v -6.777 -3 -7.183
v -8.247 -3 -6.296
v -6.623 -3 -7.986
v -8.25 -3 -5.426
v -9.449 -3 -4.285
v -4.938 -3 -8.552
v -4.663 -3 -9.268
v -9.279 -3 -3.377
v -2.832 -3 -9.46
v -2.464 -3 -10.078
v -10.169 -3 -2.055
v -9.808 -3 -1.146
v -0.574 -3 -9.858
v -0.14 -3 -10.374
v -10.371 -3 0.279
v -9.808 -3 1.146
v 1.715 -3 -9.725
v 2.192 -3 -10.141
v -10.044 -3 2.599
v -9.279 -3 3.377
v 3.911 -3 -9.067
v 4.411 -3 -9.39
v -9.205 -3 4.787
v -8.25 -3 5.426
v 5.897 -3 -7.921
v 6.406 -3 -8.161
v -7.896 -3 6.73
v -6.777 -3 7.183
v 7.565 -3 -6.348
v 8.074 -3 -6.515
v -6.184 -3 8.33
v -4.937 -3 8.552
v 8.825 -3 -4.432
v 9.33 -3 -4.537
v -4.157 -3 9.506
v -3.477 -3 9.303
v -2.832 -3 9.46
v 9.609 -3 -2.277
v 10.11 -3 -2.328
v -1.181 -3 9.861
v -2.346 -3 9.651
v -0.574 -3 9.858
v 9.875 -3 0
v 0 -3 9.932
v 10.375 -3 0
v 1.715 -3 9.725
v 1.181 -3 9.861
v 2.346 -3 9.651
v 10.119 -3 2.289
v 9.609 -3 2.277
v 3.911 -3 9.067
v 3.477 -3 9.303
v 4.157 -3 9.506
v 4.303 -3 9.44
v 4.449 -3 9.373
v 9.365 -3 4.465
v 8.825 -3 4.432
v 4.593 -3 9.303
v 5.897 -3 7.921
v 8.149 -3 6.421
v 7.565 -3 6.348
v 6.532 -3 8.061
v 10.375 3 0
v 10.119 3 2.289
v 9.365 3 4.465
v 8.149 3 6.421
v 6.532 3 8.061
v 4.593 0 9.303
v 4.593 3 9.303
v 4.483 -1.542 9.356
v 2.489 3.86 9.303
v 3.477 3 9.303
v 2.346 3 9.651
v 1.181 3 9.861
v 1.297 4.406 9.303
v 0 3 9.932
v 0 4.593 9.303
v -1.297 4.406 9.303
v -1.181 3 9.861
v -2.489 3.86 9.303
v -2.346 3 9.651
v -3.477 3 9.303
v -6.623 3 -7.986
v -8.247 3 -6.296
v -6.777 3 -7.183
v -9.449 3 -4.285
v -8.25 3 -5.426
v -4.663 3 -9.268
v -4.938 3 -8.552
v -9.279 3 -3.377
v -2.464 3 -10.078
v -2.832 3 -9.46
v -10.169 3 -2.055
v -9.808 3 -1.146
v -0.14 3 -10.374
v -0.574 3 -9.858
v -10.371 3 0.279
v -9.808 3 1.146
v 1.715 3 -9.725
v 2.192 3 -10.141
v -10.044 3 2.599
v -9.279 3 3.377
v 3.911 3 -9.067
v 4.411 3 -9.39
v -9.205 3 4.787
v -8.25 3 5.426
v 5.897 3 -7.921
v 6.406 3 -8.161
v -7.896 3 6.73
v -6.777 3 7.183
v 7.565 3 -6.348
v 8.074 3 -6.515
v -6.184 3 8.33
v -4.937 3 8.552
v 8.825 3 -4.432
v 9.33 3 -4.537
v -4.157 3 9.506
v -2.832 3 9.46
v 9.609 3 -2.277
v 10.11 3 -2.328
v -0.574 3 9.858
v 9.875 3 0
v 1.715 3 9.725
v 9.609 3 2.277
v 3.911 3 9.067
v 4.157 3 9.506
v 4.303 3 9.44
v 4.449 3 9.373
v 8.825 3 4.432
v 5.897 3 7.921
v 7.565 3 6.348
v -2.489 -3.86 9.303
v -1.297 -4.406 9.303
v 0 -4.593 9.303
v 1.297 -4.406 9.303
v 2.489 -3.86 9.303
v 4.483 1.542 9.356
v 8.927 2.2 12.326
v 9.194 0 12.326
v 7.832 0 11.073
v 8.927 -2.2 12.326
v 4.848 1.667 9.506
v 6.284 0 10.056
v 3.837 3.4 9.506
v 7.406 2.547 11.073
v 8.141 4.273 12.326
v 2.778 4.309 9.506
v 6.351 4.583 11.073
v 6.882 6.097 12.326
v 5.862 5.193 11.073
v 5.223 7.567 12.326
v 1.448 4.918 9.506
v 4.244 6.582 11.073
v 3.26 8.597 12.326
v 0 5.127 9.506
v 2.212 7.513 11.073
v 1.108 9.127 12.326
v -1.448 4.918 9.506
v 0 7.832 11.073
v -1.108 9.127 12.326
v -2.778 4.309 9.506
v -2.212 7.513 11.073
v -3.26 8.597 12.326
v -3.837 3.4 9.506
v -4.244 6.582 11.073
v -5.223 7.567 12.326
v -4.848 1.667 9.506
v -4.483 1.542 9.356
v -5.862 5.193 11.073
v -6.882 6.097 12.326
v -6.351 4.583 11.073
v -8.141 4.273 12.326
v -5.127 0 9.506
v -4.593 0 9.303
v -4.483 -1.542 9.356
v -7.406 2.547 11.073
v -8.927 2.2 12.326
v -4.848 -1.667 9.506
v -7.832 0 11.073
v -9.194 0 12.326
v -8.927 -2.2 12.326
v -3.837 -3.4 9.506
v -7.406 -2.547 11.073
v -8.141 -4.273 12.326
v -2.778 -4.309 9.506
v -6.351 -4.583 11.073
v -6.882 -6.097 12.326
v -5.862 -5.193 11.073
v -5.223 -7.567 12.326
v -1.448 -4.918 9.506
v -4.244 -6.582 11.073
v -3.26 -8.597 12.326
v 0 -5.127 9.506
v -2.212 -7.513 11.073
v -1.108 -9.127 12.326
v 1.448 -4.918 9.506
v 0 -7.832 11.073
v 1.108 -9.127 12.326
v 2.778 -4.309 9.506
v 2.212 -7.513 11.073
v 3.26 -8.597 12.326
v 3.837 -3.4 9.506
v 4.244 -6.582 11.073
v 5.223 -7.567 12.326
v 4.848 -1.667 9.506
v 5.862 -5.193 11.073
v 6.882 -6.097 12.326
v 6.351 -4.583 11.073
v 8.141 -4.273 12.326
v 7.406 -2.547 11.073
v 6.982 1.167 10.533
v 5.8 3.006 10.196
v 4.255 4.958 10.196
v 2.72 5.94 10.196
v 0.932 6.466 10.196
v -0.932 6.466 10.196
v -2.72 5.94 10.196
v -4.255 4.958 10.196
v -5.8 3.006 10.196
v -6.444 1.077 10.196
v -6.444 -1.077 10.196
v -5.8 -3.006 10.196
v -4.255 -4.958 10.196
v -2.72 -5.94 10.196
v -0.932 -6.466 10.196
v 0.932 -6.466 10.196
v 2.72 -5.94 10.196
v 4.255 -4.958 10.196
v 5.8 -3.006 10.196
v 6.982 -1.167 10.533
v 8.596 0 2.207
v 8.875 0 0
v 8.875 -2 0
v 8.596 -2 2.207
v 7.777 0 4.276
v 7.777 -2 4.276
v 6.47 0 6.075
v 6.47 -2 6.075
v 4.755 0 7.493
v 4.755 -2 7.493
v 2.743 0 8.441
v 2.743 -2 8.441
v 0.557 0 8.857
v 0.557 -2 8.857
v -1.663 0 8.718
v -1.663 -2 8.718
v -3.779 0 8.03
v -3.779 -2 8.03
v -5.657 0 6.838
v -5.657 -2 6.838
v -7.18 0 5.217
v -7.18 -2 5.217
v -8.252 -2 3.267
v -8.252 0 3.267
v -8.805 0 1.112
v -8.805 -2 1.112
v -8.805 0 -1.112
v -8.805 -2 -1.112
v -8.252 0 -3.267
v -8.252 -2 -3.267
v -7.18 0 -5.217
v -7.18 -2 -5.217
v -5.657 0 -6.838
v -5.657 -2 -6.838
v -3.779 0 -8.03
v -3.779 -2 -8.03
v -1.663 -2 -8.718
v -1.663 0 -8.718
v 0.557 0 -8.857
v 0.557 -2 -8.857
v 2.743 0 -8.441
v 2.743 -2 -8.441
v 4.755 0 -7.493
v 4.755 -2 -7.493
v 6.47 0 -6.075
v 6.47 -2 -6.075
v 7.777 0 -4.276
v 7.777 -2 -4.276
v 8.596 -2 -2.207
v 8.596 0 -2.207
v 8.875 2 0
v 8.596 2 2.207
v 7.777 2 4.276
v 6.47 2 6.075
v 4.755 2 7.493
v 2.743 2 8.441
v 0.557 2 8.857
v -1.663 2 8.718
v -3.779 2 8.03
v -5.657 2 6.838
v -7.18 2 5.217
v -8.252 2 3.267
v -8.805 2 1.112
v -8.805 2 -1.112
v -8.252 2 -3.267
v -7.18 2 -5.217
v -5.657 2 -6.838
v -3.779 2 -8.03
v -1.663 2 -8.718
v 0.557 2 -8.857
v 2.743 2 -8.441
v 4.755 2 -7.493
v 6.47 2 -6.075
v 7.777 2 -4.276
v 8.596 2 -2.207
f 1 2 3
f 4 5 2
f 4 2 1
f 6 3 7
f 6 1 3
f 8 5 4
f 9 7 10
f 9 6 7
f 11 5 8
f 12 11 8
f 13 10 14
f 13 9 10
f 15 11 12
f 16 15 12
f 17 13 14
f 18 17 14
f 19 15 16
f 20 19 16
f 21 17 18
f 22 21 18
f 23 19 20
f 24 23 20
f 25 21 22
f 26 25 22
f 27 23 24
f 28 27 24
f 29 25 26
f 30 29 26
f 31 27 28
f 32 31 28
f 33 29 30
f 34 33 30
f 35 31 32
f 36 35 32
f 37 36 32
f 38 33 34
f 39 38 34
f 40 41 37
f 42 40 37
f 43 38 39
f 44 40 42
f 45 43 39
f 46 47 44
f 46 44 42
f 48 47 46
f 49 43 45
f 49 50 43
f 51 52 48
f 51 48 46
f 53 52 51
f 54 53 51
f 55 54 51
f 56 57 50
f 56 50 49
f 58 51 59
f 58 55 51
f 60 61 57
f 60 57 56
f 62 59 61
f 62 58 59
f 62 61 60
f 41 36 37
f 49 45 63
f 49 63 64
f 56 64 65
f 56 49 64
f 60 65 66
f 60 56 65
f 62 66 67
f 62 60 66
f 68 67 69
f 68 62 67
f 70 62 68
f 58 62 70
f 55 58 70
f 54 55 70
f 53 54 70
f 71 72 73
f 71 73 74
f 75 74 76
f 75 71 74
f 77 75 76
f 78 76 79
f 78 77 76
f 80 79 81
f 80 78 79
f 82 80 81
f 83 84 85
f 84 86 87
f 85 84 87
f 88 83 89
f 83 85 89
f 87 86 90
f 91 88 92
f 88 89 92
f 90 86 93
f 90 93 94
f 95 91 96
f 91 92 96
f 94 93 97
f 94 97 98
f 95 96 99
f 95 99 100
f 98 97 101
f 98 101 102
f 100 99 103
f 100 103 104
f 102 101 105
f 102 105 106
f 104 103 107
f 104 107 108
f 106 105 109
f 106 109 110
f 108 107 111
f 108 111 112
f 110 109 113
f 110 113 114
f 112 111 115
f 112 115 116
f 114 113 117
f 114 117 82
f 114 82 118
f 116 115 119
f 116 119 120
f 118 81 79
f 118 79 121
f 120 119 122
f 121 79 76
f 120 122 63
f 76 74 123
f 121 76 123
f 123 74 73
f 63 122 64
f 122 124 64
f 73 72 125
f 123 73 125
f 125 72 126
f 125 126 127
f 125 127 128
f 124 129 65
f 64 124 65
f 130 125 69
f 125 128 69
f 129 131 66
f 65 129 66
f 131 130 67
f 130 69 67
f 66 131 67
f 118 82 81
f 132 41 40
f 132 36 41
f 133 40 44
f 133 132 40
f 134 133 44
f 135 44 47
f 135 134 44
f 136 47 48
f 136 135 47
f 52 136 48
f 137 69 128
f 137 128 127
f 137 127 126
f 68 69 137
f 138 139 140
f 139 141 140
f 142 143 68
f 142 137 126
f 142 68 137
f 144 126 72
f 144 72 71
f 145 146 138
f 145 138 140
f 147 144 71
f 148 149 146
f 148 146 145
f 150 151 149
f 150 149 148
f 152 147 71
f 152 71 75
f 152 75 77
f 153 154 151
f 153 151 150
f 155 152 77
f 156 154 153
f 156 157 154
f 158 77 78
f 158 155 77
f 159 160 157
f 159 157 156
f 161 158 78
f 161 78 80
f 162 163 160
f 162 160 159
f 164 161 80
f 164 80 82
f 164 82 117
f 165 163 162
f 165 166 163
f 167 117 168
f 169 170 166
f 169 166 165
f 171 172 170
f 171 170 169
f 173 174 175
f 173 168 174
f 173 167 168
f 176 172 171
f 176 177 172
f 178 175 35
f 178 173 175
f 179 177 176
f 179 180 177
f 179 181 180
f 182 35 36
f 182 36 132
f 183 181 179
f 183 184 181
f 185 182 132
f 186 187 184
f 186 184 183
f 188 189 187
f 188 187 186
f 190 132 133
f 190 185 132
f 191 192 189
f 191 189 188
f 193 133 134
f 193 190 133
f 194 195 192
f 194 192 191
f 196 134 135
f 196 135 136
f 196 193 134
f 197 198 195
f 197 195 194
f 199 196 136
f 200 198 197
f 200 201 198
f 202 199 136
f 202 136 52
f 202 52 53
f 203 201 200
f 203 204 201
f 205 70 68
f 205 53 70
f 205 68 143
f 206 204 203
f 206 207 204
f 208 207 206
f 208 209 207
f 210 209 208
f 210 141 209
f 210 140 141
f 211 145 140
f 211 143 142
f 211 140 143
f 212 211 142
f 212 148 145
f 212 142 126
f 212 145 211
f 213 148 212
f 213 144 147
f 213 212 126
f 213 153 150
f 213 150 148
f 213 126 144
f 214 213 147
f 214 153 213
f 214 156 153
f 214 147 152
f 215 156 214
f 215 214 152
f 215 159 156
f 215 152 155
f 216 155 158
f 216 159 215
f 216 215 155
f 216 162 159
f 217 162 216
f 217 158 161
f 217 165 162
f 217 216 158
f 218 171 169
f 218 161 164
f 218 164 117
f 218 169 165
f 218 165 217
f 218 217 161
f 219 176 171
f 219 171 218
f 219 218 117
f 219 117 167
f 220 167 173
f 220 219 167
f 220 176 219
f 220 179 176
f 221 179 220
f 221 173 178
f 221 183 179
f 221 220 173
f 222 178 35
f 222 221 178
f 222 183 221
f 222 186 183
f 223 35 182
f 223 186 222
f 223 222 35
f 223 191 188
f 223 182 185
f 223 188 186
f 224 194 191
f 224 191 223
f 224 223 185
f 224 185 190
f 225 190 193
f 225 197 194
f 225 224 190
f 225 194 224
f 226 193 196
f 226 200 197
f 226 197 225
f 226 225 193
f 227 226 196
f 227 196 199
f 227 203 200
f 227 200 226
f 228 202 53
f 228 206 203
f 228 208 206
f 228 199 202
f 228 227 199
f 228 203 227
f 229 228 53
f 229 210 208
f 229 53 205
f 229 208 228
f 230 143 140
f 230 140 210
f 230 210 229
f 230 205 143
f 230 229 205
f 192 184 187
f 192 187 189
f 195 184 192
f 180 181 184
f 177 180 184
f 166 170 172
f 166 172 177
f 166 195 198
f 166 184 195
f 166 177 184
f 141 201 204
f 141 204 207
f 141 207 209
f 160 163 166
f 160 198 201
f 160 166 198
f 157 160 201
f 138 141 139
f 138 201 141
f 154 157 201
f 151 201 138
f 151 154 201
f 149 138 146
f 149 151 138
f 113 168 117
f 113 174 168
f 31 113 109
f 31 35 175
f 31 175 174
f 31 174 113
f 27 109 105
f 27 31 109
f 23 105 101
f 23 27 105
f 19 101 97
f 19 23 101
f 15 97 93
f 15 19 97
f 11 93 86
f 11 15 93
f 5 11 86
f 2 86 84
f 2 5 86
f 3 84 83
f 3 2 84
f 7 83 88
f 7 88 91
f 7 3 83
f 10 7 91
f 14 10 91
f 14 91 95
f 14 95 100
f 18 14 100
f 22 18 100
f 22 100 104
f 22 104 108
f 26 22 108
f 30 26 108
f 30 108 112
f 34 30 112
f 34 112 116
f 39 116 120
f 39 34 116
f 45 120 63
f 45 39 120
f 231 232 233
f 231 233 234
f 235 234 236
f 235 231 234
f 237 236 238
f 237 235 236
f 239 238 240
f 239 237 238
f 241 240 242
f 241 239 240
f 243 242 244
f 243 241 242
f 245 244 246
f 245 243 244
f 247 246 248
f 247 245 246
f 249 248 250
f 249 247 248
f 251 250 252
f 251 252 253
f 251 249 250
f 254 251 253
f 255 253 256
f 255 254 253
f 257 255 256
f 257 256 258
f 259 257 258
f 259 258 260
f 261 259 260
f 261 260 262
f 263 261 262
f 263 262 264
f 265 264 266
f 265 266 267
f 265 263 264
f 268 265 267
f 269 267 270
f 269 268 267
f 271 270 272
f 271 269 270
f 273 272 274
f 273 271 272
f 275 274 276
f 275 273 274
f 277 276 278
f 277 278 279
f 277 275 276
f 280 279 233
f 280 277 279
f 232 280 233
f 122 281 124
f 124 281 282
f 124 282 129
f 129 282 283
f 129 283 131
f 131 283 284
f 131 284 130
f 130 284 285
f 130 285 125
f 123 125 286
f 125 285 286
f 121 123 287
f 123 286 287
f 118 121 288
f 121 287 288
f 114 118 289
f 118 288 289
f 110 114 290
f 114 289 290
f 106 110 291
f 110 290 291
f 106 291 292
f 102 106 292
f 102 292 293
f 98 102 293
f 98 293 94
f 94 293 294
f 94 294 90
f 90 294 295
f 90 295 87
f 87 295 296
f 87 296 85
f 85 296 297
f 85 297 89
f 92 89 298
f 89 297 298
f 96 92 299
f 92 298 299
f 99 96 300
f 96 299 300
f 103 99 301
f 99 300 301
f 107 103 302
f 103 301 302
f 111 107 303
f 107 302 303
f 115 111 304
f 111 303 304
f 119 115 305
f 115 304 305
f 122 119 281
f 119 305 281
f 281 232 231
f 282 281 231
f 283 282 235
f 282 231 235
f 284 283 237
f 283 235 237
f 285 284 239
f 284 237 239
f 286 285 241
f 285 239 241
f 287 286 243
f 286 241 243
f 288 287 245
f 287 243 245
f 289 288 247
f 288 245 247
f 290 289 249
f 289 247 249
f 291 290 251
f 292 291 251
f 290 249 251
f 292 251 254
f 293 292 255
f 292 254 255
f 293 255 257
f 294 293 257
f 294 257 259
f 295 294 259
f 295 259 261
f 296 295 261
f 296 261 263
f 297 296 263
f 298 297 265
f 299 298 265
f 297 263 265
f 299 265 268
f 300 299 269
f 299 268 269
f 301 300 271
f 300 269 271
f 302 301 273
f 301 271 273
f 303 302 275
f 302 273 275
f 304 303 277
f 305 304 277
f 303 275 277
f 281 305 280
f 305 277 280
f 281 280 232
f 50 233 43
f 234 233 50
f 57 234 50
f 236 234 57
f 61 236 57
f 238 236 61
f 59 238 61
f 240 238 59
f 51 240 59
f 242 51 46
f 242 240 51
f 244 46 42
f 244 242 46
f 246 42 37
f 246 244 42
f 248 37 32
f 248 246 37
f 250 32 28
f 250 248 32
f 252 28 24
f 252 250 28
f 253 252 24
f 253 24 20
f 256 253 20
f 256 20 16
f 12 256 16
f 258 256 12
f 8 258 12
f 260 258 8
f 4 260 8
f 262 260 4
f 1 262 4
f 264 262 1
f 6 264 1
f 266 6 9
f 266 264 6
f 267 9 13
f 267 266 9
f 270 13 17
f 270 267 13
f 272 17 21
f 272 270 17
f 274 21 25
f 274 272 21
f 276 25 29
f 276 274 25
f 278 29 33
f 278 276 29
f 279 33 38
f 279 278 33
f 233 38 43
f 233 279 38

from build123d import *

# Parameters (mm, degrees)
F0_R          = 8.875
F3_DEPTH      = 3
F3_DEPTH_BACK = 3
F4_SIZE       = 1


with BuildPart() as f2:
    # F0 (on Front) → F2 (revolve)
    with BuildSketch(Plane.XZ):
        with BuildLine():
            ThreePointArc((0, 10.375), (2.3580401671, 10.1034781917), (4.5926568488, 9.3031246401))
            ThreePointArc((4.5926568488, 9.3031246401), (7.0784745003, 10.5329995788), (9.1944970191, 12.325854972))
            Line((9.1944970191, 12.325854972), (0, 12.325854972))
            Line((0, 12.325854972), (0, 10.375))
        make_face()
    revolve(axis=Axis((0, 0, 0), (0, 0, 1)))

    # F0 (on Front) → F3 (join, two sides)
    with BuildSketch(Plane.XZ) as f3_sk:
        with BuildLine():
            ThreePointArc((0, 10.375), (-7.3362328548, -7.3362328548), (10.375, 0))
            ThreePointArc((10.375, 0), (8.8116241354, 5.4768517505), (4.5926568488, 9.3031246401))
            Line((4.5926568488, 9.3031246401), (0, 9.3031246401))
            Line((0, 9.3031246401), (0, 10.375))
        make_face()
        Circle(F0_R, mode=Mode.SUBTRACT)
        with BuildLine():
            Line((0, 9.3031246401), (4.5926568488, 9.3031246401))
            ThreePointArc((4.5926568488, 9.3031246401), (2.3580401671, 10.1034781917), (0, 10.375))
            Line((0, 10.375), (0, 9.3031246401))
        make_face()
    extrude(amount=F3_DEPTH)
    extrude(f3_sk.sketch, amount=-F3_DEPTH_BACK)

    # F4
    f4_edges = [f2.edges().sort_by_distance(p)[0] for p in [
        (-8.875, -3, 0),
        (-8.875, 3, 0),
    ]]
    chamfer(f4_edges, length=F4_SIZE)


solid = f2.part
